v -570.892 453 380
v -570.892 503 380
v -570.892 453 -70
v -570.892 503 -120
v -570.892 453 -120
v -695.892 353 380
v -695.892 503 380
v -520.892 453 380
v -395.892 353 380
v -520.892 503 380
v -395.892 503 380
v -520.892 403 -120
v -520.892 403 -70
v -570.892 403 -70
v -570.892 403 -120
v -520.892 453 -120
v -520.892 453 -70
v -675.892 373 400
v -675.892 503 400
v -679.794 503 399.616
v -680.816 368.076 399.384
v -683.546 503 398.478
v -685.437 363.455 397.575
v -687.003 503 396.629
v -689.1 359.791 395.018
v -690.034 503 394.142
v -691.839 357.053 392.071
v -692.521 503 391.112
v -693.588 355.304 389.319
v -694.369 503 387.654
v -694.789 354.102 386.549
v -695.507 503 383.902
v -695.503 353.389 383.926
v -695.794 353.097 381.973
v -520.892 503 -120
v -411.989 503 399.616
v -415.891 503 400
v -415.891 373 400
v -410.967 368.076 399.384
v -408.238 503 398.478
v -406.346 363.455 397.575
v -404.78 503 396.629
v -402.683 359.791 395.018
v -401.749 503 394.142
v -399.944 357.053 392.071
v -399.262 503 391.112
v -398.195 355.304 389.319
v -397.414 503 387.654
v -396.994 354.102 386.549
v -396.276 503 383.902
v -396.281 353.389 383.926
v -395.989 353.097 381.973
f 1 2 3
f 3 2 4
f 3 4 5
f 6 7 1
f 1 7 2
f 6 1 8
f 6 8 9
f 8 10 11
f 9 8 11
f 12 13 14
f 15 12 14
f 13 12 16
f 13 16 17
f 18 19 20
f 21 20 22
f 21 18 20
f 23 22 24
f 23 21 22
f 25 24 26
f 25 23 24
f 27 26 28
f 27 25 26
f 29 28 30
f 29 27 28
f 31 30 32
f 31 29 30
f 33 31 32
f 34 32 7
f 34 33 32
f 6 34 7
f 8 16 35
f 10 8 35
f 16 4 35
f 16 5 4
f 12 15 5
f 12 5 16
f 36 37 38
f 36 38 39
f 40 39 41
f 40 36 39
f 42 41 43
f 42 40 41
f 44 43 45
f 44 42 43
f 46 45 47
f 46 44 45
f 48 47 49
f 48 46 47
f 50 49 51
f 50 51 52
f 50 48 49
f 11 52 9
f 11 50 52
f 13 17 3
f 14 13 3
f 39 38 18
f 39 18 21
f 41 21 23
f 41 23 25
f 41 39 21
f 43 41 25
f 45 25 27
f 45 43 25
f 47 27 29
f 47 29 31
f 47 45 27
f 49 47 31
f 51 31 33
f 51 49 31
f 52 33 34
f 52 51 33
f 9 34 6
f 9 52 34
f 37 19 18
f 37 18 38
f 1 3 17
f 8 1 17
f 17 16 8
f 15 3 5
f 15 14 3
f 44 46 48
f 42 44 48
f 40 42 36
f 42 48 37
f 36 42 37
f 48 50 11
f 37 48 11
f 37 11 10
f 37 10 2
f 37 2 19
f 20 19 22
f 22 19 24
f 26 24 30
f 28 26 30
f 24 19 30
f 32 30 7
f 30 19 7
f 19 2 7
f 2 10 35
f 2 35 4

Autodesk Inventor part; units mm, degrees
ref_plane "YZ Plane" through (0, 0, 0) normal (1, 0, 0) x (0, 1, 0)
ref_plane "XZ Plane" through (0, 0, 0) normal (0, 1, 0) x (-1, 0, 0)
ref_plane "XY Plane" through (0, 0, 0) normal (0, 0, 1) x (1, 0, 0)
ref_plane "Work Plane1" through (-0.3785, 403, -180) normal (0, 1, 0) x (-1, 0, 0)
sketch "Sketch1" plane through (-0.3785, 403, -180) normal (0, 1, 0) x (-1, 0, 0)
  line L0 (545.5132, 110) -> (570.5132, 110)
  line L1 (570.5132, 110) -> (570.5132, 60)
  line L2 (570.5132, 60) -> (545.5132, 60)
  line L3 (545.5132, 60) -> (520.5132, 60)
  line L4 (520.5132, 60) -> (520.5132, 110)
  line L5 (520.5132, 110) -> (545.5132, 110)
  point P0 (-0.3785, 180)
  dimension "d2" = 25
  dimension "d3" = 25
extrude "Extrusion1" add sketch "Sketch1" along normal blind 50
sketch "Sketch2" plane through (-520.8916, 403, -120) normal (0, 0, -1) x (-1, 0, 0)
  line L0 (50, 50) -> (0, 50) projected
  line L1 (50, 50) -> (0, 50)
  line L2 (0, 50) -> (0, 100)
  line L3 (0, 100) -> (50, 100)
  line L4 (50, 100) -> (50, 50)
  point P0 (-520.8916, -403)
  dimension "d6" = 50
extrude "Extrusion2" add sketch "Sketch2" against normal blind 500
sketch "Sketch3" plane through (-520.8916, 403, 380) normal (0, 0, 1) x (1, 0, 0)
  line L0 (0, 100) -> (-50, 100) projected
  line L1 (-50, 100) -> (-50, 50) projected
  line L2 (-50, 50) -> (0, 50) projected
  line L3 (0, 50) -> (0, 100) projected
  line L4 (-25, 100) -> (125, 100)
  line L5 (125, 100) -> (-175, 100)
  line L6 (-175, 100) -> (-175, -50)
  line L7 (-175, -50) -> (125, -50)
  line L8 (125, -50) -> (125, 100)
  point P0 (520.8916, -403)
  dimension "d9" = 150
  dimension "d10" = 300
  dimension "d11" = 150
extrude "Extrusion3" add sketch "Sketch3" along normal blind 20
fillet "Fillet1" radius 20 3 edges at (-695.8916, 428, 400) (-545.8916, 353, 400) (-395.8916, 428, 400)
